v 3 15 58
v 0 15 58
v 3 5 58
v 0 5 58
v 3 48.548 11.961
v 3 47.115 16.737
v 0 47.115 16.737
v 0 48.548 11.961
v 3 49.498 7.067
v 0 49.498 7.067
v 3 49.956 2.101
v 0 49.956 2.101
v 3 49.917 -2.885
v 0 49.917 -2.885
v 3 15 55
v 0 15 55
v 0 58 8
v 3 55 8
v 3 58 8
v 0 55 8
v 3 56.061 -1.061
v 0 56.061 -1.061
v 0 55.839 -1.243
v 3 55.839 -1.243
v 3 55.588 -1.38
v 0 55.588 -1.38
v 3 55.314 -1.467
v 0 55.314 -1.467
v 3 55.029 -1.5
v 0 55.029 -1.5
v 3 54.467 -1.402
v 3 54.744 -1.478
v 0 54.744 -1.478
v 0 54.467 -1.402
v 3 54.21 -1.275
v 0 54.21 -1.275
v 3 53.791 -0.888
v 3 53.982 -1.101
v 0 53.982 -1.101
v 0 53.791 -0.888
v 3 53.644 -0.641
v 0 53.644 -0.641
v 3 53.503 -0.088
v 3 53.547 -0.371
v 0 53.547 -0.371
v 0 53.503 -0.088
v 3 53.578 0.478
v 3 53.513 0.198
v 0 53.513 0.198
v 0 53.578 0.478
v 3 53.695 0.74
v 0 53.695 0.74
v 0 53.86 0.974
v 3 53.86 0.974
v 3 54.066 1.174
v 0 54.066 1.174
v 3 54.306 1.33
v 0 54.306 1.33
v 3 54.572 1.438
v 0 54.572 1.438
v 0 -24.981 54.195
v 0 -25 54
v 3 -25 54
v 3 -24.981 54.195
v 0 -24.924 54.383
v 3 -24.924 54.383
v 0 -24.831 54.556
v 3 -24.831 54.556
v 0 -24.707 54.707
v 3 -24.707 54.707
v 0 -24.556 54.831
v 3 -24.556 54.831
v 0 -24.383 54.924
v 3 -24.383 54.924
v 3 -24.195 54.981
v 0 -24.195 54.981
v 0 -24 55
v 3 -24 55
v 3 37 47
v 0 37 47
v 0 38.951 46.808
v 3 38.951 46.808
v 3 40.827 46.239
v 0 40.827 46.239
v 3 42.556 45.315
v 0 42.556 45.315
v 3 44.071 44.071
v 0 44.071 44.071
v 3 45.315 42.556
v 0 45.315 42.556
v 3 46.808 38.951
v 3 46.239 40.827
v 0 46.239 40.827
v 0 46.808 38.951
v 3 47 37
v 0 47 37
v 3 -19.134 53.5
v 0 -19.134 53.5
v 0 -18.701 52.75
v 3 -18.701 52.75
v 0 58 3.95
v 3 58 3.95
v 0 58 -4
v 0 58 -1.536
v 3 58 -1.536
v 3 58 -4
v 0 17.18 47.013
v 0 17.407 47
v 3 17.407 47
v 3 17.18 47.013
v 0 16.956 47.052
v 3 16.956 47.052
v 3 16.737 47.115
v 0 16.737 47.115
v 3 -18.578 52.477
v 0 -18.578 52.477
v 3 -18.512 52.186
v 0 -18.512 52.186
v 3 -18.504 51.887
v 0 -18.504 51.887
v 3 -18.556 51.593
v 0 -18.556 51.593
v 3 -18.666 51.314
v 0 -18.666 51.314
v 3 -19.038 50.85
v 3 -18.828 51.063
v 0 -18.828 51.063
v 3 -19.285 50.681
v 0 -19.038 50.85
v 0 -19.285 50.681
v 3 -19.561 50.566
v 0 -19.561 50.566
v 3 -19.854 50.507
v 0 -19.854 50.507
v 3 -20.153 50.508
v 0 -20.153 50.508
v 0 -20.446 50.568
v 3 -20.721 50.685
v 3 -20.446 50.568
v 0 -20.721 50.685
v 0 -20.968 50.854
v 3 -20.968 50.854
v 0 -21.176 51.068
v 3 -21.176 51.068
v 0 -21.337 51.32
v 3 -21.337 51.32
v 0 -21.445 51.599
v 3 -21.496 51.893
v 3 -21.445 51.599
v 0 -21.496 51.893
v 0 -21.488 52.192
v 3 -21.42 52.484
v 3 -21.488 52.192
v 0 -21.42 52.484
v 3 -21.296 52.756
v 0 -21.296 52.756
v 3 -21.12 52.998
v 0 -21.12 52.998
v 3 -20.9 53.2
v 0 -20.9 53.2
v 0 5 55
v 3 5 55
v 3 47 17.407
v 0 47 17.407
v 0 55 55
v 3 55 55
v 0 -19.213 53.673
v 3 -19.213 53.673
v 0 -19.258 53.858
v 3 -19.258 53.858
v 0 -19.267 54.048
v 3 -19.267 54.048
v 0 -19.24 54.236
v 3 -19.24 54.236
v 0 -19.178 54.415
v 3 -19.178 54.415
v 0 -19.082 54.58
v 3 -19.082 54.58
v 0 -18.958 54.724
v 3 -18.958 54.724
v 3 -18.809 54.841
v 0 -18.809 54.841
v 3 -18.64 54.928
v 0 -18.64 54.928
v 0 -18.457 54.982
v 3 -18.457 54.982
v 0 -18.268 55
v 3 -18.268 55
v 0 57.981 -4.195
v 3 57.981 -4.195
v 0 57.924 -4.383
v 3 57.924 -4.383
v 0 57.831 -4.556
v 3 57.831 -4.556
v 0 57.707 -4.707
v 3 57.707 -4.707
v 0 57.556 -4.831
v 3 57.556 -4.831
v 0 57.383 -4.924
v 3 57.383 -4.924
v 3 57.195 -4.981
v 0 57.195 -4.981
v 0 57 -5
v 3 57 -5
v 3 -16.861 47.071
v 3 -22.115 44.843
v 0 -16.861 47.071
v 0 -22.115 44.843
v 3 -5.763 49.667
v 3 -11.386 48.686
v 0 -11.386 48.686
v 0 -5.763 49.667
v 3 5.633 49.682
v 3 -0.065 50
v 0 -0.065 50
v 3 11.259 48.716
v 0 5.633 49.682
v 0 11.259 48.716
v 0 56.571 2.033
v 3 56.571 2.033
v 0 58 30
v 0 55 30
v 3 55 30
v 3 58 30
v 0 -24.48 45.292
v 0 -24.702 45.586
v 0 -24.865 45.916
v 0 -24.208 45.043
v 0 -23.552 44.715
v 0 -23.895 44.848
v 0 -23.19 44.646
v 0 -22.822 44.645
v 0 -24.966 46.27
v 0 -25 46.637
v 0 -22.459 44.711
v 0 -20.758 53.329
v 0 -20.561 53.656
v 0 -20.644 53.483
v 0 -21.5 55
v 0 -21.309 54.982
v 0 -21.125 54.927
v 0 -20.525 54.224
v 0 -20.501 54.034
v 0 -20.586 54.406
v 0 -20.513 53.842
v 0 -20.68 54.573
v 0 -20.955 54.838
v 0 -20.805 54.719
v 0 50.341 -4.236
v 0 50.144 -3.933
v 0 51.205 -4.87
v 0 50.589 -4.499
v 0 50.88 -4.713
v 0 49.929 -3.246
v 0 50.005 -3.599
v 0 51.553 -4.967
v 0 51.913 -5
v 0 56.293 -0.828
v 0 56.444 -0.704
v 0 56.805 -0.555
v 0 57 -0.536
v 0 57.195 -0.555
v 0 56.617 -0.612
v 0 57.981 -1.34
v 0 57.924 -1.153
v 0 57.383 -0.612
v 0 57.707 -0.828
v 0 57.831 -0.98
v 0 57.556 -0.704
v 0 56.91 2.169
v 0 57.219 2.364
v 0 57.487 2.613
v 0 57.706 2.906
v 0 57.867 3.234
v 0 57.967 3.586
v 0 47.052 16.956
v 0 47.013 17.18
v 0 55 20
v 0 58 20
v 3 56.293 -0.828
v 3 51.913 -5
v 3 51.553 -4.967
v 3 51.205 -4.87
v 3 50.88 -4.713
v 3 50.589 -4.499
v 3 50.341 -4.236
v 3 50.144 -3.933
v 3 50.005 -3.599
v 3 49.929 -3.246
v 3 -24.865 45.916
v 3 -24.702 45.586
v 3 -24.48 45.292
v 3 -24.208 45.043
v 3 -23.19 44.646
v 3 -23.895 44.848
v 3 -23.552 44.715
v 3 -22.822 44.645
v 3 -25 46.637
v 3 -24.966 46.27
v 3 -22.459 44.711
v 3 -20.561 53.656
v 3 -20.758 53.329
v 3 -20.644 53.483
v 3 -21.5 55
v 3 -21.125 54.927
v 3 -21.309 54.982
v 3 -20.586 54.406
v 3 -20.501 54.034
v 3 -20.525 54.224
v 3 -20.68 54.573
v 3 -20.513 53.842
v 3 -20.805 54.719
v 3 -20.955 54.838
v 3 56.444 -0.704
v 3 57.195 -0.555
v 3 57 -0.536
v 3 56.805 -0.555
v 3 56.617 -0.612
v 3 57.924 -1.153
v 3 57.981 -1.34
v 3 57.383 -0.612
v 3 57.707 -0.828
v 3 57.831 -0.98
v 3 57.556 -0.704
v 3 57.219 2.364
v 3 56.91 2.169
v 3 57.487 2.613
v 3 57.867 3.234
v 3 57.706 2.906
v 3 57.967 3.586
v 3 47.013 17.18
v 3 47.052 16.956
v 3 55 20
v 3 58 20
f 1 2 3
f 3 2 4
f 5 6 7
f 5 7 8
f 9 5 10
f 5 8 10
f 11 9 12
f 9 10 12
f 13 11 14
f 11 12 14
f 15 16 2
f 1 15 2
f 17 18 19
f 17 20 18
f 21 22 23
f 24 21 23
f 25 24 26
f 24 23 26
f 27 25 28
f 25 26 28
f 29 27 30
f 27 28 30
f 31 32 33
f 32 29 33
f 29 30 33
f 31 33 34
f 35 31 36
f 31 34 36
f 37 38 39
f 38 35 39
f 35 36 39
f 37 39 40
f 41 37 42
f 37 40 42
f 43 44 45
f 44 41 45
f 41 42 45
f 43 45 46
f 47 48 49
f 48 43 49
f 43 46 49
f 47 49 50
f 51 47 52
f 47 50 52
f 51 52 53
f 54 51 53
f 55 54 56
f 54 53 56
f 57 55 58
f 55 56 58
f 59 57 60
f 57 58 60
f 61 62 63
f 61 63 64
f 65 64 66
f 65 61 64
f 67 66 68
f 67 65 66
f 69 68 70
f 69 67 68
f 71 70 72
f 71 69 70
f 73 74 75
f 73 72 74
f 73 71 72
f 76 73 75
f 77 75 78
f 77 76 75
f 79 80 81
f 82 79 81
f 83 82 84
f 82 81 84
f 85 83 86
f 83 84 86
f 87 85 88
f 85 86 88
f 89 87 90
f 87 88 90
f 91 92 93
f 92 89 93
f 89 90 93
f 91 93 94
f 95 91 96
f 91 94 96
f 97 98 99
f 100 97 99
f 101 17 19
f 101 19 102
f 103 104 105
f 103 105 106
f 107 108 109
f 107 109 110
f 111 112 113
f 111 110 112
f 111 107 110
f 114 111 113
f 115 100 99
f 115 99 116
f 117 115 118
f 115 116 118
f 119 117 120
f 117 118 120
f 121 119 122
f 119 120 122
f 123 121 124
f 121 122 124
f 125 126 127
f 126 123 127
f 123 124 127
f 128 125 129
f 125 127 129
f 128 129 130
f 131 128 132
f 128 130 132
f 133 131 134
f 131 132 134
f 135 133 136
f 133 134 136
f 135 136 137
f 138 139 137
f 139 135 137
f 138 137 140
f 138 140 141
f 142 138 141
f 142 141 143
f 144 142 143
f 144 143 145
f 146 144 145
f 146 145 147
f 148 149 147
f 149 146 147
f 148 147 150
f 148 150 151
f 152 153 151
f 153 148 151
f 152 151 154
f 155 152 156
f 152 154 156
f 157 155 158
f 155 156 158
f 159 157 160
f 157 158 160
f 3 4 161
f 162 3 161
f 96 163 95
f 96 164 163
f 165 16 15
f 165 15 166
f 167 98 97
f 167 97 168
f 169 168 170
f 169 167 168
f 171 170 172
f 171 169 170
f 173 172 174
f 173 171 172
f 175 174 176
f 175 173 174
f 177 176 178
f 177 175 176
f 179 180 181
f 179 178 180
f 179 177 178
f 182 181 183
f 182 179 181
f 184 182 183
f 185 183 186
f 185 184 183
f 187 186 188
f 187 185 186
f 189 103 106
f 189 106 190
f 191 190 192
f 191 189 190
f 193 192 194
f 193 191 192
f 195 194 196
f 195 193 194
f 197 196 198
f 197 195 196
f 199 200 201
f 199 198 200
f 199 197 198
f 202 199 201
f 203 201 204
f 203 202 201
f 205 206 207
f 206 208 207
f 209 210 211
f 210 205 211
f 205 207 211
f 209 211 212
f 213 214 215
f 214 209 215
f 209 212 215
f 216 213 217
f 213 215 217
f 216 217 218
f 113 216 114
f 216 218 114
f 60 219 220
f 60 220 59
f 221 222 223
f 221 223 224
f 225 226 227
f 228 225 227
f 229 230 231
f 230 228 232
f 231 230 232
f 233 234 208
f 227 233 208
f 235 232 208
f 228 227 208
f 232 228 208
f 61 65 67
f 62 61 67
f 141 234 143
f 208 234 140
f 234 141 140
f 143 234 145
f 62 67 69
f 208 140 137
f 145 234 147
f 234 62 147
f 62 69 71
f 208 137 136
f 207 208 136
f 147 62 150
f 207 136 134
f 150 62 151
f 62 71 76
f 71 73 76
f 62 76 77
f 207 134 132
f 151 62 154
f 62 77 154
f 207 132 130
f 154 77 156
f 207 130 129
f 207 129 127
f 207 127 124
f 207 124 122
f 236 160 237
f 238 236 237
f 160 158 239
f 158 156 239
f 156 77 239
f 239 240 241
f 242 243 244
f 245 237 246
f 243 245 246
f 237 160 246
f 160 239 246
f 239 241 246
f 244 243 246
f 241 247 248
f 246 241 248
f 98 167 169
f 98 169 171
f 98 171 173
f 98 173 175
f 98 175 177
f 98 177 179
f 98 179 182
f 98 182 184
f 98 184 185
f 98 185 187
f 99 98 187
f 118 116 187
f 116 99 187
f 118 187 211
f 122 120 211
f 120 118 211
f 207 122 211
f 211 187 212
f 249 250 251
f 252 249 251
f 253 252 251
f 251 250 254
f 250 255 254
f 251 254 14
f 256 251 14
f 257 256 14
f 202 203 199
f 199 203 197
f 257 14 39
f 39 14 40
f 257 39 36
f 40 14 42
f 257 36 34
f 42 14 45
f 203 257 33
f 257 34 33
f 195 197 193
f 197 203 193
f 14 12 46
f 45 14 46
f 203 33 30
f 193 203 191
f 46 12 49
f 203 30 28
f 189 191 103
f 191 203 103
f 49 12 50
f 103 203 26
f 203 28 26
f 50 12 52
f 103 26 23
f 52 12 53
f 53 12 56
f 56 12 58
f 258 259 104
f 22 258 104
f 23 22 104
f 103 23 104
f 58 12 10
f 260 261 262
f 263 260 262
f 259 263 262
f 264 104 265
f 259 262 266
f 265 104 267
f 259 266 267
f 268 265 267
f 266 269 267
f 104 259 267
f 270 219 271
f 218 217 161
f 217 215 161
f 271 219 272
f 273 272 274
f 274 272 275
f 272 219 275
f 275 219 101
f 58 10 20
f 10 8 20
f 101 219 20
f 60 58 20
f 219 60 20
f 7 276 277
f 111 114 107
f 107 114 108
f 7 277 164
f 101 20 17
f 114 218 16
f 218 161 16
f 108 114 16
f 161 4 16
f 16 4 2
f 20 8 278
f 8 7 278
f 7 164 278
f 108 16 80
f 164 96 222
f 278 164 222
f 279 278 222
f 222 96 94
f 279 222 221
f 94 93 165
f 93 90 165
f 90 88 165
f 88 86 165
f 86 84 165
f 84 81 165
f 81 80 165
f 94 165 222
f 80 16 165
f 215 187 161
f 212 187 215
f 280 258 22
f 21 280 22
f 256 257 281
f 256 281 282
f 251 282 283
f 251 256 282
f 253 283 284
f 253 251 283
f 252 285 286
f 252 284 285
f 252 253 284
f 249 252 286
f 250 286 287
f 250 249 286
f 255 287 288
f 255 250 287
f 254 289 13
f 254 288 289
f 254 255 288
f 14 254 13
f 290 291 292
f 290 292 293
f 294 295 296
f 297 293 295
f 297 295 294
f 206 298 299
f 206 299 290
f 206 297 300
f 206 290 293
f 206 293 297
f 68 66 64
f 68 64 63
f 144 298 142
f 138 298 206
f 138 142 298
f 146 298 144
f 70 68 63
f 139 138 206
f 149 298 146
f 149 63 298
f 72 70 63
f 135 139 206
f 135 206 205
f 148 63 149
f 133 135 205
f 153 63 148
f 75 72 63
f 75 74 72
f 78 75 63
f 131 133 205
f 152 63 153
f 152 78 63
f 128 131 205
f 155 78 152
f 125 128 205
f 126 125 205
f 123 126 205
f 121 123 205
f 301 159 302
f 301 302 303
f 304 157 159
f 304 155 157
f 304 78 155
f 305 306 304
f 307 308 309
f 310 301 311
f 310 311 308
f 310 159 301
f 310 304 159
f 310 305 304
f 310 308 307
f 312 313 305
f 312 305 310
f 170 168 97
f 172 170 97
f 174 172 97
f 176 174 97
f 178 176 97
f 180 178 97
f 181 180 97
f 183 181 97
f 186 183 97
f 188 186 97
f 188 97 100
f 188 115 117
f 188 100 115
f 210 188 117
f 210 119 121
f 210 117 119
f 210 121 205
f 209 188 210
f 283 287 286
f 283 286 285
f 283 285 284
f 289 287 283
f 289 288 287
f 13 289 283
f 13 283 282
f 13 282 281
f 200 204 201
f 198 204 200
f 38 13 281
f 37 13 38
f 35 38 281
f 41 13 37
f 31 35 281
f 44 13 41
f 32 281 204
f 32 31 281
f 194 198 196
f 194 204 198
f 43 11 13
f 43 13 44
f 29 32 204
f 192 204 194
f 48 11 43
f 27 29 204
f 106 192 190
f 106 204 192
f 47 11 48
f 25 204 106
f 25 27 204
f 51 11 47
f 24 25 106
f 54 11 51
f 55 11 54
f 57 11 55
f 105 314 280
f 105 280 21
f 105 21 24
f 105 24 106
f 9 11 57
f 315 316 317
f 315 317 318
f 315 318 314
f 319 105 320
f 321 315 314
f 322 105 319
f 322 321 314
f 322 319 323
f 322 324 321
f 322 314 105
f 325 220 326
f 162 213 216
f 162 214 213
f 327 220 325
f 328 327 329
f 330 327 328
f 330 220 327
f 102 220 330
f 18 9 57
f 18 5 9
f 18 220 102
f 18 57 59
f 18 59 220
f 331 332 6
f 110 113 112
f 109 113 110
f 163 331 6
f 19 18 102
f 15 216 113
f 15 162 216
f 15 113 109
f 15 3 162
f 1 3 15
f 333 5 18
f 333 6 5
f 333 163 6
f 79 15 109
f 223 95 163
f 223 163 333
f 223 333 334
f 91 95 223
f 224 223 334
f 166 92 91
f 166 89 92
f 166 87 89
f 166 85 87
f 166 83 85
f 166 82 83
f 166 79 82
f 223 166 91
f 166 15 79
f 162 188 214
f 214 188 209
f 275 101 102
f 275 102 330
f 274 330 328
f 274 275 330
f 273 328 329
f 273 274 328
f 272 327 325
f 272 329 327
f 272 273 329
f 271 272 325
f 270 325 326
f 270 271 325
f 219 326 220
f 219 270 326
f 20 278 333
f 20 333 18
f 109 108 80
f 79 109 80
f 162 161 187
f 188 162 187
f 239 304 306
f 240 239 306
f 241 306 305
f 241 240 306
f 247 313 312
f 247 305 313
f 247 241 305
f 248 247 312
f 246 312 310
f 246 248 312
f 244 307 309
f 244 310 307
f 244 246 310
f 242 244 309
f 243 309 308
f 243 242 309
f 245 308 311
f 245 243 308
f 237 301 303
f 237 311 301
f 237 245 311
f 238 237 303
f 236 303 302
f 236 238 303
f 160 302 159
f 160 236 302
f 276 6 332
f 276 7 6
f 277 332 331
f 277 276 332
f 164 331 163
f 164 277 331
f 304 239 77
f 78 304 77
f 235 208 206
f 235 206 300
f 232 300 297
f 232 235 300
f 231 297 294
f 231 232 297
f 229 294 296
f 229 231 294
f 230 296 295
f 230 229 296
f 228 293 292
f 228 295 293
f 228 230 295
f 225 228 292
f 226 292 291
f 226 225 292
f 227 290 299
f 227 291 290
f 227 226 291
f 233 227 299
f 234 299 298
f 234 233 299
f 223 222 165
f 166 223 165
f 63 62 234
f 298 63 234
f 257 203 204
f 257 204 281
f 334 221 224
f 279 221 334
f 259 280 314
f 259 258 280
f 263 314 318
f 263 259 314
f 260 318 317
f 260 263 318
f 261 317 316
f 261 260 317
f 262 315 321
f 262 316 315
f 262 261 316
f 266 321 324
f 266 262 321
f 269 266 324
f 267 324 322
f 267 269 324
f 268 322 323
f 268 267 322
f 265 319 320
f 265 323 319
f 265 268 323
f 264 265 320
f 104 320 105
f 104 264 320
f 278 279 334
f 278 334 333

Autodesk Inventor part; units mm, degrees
ref_plane "YZ Plane" through (0, 0, 0) normal (1, 0, 0) x (0, 1, 0)
ref_plane "XZ Plane" through (0, 0, 0) normal (0, 1, 0) x (-1, 0, 0)
ref_plane "XY Plane" through (0, 0, 0) normal (0, 0, 1) x (1, 0, 0)
sketch "Sketch2" plane through (0, 0, 0) normal (1, 0, 0) x (0, 1, 0)
  line L0 (55, 30) -> (58, 30)
  line L1 (58, 30) -> (58, 20)
  line L2 (58, 20) -> (55, 20)
  line L3 (15, 55) -> (15, 58)
  line L4 (15, 58) -> (5, 58)
  line L5 (5, 58) -> (5, 55)
  line L6 (55, 30) -> (55, 55)
  line L7 (15, 55) -> (55, 55)
  line L8 (55, 20) -> (55, 8)
  line L9 (55, 8) -> (58, 8)
  arc A0 (54.5719, 1.4376) -> (56.0607, -1.0607) centre (55, 0) ccw
  line L10 (57, -5) -> (51.9134, -5)
  line L11 (56.5709, 2.033) -> (54.5719, 1.4376)
  line L12 (56.2929, -0.8284) -> (56.0607, -1.0607)
  line L13 (58, 8) -> (58, 3.9497)
  line L14 (58, -1.5355) -> (58, -4)
  arc A1 (56.5709, 2.033) -> (58, 3.9497) centre (56, 3.9497) ccw
  arc A2 (58, -1.5355) -> (56.2929, -0.8284) centre (57, -1.5355) ccw
  arc A3 (57, -5) -> (58, -4) centre (57, -4) ccw
  line L15 (-25, 54) -> (-25, 46.6369)
  arc A4 (-20.9, 53.2) -> (-18.701, 52.75) centre (-20, 52) ccw
  line L16 (-20.9, 53.2) -> (-20.9, 53.2)
  line L17 (-19.134, 53.5) -> (-18.701, 52.75)
  line L18 (5, 55) -> (-18.2679, 55)
  line L19 (-21.5, 55) -> (-24, 55)
  arc A5 (-18.2679, 55) -> (-19.134, 53.5) centre (-18.2679, 54) ccw
  arc A6 (-25, 46.6369) -> (-22.1154, 44.8432) centre (-23, 46.6369) ccw
  arc A7 (-24, 55) -> (-25, 54) centre (-24, 54) ccw
  arc A8 (-20.9, 53.2) -> (-21.5, 55) centre (-21.5, 54) ccw
  arc A9 (49.9167, -2.8846) -> (47.1154, 16.7374) centre (0, 0) ccw
  arc A10 (16.7374, 47.1154) -> (-22.1154, 44.8432) centre (0, 0) ccw
  line L20 (47, 17.4069) -> (47, 37)
  line L21 (17.4069, 47) -> (37, 47)
  arc A11 (47, 37) -> (37, 47) centre (37, 37) ccw
  arc A12 (49.9167, -2.8846) -> (51.9134, -5) centre (51.9134, -3) ccw
  arc A13 (16.7374, 47.1154) -> (17.4069, 47) centre (17.4069, 49) ccw
  arc A14 (47, 17.4069) -> (47.1154, 16.7374) centre (49, 17.4069) ccw
  point P0 (-25, 43.3013)
  point P1 (58, -5)
  point P2 (-25, 55)
  point P3 (49.7494, -5)
  point P4 (49.7494, -5)
  point P5 (17.0587, 47)
  point P6 (47, 17.0587)
  dimension "d5" = 10
  dimension "d6" = 10
  dimension "d13" = 40
  dimension "d14" = 25
  dimension "d15" = 3
  dimension "d16" = 3
  dimension "d22" = 55
  dimension "d23" = 55
  dimension "d43" = 12
  dimension "d44" = 3
  dimension "d46" = 3
  dimension "d48" = 3
  dimension "d53" = 2
  dimension "d54" = 1
  dimension "d57" = 80
  dimension "d58" = 3
  dimension "d59" = 5
  dimension "d61" = 3
  dimension "d64" = 1
  dimension "d65" = 2
  dimension "d66" = 1
  dimension "d67" = 3
  dimension "d75" = 4.0503
  dimension "d76" = 60
  dimension "d78" = 5
  dimension "d79" = 3
  dimension "d87" = 60
  dimension "d92" = 8
  dimension "d93" = 50
  dimension "d94" = 50
  dimension "d95" = 8
  dimension "d96" = 10
  dimension "d97" = 2
  dimension "d98" = 2
extrude "Extrusion3" add sketch "Sketch2" along normal blind 3
properties part number "OpenROV 2_3 Dev Tube Brace"
